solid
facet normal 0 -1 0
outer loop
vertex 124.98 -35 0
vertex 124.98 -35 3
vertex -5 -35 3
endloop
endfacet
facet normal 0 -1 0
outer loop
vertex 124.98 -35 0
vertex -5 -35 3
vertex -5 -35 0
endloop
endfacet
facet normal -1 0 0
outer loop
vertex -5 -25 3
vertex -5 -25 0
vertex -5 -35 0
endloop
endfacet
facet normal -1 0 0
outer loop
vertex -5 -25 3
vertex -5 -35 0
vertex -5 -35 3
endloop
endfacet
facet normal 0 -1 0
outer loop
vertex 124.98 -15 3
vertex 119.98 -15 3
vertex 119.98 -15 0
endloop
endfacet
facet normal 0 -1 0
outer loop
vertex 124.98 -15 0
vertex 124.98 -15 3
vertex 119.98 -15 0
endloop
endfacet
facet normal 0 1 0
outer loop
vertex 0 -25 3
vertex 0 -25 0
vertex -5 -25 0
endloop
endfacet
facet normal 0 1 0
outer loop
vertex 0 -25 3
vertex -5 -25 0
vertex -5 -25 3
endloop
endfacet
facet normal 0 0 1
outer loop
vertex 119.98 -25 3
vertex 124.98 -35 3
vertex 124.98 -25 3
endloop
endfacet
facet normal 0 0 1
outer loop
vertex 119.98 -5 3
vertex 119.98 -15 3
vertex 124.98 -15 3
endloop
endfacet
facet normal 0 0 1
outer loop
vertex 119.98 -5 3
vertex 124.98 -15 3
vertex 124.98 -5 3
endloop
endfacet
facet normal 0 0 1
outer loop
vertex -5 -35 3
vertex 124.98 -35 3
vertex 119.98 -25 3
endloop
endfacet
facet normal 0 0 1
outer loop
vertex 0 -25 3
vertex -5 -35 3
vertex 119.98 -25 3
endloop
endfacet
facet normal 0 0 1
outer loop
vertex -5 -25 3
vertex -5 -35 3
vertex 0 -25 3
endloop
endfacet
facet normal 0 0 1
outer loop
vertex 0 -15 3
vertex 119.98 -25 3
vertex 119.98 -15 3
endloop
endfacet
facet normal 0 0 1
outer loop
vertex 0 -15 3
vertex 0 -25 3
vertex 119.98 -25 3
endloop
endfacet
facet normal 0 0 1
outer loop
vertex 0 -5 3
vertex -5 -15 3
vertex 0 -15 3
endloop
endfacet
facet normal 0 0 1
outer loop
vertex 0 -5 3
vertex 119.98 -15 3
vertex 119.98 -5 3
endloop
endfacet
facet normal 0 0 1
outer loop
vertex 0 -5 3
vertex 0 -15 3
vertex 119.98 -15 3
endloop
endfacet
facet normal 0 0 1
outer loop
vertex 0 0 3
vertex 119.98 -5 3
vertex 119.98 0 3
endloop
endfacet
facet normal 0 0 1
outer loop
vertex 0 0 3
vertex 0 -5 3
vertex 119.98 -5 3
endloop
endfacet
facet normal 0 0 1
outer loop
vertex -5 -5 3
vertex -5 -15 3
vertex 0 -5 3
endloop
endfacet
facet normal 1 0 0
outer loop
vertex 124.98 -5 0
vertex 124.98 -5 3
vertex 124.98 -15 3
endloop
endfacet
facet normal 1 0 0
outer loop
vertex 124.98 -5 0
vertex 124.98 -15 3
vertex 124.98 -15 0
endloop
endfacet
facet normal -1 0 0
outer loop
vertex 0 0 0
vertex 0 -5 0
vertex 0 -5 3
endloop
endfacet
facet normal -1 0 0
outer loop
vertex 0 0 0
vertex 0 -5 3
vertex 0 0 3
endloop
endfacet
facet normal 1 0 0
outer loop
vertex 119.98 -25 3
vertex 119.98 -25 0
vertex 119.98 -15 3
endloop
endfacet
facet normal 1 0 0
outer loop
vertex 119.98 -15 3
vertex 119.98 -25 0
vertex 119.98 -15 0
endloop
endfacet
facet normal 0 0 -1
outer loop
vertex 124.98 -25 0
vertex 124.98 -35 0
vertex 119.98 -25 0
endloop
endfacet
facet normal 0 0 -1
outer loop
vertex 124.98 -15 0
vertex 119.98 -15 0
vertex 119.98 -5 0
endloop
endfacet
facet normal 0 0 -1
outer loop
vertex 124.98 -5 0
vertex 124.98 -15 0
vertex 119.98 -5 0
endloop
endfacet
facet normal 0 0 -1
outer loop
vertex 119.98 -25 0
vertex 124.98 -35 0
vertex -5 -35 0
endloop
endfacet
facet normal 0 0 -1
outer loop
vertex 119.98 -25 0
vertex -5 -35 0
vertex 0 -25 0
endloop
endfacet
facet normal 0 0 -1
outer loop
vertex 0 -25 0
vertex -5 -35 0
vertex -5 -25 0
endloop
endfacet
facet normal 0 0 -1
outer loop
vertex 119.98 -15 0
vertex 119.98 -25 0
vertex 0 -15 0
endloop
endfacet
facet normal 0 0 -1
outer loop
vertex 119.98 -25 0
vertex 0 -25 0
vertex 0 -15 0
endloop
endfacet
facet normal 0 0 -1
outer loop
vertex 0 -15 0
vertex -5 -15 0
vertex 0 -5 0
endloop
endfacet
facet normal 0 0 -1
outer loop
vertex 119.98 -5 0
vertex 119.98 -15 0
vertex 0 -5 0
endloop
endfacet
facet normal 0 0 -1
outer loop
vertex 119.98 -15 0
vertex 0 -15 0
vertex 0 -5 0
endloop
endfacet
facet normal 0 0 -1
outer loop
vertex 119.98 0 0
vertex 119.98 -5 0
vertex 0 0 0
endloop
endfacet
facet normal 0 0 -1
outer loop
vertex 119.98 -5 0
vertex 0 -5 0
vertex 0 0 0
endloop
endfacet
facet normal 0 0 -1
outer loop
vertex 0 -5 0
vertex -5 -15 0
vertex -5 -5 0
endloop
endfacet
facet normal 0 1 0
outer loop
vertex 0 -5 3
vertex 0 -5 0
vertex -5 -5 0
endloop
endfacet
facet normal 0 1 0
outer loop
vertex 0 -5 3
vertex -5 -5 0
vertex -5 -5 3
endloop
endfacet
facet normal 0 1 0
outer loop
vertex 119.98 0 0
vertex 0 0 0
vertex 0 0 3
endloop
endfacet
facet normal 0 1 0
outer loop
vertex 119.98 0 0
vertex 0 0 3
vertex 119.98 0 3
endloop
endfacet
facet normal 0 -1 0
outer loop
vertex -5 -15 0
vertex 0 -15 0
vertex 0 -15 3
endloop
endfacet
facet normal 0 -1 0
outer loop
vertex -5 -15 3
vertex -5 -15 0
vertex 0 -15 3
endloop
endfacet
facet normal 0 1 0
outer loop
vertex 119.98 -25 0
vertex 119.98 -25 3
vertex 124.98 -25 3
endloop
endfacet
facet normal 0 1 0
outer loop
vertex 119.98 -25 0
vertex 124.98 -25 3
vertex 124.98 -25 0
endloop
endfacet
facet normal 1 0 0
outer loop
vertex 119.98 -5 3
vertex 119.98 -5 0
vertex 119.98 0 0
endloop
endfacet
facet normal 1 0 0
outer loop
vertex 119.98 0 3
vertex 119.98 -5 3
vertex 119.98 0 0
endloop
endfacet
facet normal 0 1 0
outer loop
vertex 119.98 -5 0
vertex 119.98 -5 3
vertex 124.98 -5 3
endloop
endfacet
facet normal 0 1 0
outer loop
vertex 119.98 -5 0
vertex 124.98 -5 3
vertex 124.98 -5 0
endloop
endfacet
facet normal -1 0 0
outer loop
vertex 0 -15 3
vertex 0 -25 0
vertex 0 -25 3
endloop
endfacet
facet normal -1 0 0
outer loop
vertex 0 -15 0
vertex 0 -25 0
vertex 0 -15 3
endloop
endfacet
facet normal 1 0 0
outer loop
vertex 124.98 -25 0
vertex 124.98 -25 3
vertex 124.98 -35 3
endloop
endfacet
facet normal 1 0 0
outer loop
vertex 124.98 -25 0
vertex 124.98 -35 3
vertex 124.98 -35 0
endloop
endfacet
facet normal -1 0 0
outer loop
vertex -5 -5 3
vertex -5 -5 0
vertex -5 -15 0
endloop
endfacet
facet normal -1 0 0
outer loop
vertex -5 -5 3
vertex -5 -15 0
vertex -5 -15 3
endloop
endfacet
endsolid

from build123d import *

# Parameters (mm, degrees)
ESQUISSE1_W                = 119.98
ESQUISSE1_H                = 35
BOSS_EXTRU_1_DEPTH         = 3
ESQUISSE2_W                = 3
ESQUISSE2_H                = 10
BOSS_EXTRU_2_DEPTH         = 5
R_P_TITION_LIN_AIRE1_COUNT = 2
R_P_TITION_LIN_AIRE1_PITCH = 20
ESQUISSE3_W                = 3
ESQUISSE3_H                = 10
BOSS_EXTRU_3_DEPTH         = 5
R_P_TITION_LIN_AIRE2_COUNT = 2
R_P_TITION_LIN_AIRE2_PITCH = 20


with BuildPart() as part:
    # Esquisse1 → Boss.-Extru.1 (new body)
    with BuildSketch(Plane.XY):
        with Locations((59.99, -17.5)):
            Rectangle(ESQUISSE1_W, ESQUISSE1_H)
    extrude(amount=BOSS_EXTRU_1_DEPTH)

    # Esquisse2 → Boss.-Extru.2 (add)
    with BuildSketch(Plane.ZY):
        with Locations((1.5, -30)):
            Rectangle(ESQUISSE2_W, ESQUISSE2_H)
    boss_extru_2 = extrude(amount=BOSS_EXTRU_2_DEPTH)

    # Répétition linéaire1: Boss.-Extru.2 ×2
    with Locations(*[(0, i * R_P_TITION_LIN_AIRE1_PITCH, 0) for i in range(1, R_P_TITION_LIN_AIRE1_COUNT)]):
        add(boss_extru_2)

    # Esquisse3 → Boss.-Extru.3 (add)
    with BuildSketch(Plane(origin=(119.98, 0, 0), x_dir=(0, 0, -1), z_dir=(1, 0, 0))):
        with Locations((-1.5, -30)):
            Rectangle(ESQUISSE3_W, ESQUISSE3_H)
    boss_extru_3 = extrude(amount=BOSS_EXTRU_3_DEPTH)

    # Répétition linéaire2: Boss.-Extru.3 ×2
    with Locations(*[(0, i * R_P_TITION_LIN_AIRE2_PITCH, 0) for i in range(1, R_P_TITION_LIN_AIRE2_COUNT)]):
        add(boss_extru_3)


solid = part.part
